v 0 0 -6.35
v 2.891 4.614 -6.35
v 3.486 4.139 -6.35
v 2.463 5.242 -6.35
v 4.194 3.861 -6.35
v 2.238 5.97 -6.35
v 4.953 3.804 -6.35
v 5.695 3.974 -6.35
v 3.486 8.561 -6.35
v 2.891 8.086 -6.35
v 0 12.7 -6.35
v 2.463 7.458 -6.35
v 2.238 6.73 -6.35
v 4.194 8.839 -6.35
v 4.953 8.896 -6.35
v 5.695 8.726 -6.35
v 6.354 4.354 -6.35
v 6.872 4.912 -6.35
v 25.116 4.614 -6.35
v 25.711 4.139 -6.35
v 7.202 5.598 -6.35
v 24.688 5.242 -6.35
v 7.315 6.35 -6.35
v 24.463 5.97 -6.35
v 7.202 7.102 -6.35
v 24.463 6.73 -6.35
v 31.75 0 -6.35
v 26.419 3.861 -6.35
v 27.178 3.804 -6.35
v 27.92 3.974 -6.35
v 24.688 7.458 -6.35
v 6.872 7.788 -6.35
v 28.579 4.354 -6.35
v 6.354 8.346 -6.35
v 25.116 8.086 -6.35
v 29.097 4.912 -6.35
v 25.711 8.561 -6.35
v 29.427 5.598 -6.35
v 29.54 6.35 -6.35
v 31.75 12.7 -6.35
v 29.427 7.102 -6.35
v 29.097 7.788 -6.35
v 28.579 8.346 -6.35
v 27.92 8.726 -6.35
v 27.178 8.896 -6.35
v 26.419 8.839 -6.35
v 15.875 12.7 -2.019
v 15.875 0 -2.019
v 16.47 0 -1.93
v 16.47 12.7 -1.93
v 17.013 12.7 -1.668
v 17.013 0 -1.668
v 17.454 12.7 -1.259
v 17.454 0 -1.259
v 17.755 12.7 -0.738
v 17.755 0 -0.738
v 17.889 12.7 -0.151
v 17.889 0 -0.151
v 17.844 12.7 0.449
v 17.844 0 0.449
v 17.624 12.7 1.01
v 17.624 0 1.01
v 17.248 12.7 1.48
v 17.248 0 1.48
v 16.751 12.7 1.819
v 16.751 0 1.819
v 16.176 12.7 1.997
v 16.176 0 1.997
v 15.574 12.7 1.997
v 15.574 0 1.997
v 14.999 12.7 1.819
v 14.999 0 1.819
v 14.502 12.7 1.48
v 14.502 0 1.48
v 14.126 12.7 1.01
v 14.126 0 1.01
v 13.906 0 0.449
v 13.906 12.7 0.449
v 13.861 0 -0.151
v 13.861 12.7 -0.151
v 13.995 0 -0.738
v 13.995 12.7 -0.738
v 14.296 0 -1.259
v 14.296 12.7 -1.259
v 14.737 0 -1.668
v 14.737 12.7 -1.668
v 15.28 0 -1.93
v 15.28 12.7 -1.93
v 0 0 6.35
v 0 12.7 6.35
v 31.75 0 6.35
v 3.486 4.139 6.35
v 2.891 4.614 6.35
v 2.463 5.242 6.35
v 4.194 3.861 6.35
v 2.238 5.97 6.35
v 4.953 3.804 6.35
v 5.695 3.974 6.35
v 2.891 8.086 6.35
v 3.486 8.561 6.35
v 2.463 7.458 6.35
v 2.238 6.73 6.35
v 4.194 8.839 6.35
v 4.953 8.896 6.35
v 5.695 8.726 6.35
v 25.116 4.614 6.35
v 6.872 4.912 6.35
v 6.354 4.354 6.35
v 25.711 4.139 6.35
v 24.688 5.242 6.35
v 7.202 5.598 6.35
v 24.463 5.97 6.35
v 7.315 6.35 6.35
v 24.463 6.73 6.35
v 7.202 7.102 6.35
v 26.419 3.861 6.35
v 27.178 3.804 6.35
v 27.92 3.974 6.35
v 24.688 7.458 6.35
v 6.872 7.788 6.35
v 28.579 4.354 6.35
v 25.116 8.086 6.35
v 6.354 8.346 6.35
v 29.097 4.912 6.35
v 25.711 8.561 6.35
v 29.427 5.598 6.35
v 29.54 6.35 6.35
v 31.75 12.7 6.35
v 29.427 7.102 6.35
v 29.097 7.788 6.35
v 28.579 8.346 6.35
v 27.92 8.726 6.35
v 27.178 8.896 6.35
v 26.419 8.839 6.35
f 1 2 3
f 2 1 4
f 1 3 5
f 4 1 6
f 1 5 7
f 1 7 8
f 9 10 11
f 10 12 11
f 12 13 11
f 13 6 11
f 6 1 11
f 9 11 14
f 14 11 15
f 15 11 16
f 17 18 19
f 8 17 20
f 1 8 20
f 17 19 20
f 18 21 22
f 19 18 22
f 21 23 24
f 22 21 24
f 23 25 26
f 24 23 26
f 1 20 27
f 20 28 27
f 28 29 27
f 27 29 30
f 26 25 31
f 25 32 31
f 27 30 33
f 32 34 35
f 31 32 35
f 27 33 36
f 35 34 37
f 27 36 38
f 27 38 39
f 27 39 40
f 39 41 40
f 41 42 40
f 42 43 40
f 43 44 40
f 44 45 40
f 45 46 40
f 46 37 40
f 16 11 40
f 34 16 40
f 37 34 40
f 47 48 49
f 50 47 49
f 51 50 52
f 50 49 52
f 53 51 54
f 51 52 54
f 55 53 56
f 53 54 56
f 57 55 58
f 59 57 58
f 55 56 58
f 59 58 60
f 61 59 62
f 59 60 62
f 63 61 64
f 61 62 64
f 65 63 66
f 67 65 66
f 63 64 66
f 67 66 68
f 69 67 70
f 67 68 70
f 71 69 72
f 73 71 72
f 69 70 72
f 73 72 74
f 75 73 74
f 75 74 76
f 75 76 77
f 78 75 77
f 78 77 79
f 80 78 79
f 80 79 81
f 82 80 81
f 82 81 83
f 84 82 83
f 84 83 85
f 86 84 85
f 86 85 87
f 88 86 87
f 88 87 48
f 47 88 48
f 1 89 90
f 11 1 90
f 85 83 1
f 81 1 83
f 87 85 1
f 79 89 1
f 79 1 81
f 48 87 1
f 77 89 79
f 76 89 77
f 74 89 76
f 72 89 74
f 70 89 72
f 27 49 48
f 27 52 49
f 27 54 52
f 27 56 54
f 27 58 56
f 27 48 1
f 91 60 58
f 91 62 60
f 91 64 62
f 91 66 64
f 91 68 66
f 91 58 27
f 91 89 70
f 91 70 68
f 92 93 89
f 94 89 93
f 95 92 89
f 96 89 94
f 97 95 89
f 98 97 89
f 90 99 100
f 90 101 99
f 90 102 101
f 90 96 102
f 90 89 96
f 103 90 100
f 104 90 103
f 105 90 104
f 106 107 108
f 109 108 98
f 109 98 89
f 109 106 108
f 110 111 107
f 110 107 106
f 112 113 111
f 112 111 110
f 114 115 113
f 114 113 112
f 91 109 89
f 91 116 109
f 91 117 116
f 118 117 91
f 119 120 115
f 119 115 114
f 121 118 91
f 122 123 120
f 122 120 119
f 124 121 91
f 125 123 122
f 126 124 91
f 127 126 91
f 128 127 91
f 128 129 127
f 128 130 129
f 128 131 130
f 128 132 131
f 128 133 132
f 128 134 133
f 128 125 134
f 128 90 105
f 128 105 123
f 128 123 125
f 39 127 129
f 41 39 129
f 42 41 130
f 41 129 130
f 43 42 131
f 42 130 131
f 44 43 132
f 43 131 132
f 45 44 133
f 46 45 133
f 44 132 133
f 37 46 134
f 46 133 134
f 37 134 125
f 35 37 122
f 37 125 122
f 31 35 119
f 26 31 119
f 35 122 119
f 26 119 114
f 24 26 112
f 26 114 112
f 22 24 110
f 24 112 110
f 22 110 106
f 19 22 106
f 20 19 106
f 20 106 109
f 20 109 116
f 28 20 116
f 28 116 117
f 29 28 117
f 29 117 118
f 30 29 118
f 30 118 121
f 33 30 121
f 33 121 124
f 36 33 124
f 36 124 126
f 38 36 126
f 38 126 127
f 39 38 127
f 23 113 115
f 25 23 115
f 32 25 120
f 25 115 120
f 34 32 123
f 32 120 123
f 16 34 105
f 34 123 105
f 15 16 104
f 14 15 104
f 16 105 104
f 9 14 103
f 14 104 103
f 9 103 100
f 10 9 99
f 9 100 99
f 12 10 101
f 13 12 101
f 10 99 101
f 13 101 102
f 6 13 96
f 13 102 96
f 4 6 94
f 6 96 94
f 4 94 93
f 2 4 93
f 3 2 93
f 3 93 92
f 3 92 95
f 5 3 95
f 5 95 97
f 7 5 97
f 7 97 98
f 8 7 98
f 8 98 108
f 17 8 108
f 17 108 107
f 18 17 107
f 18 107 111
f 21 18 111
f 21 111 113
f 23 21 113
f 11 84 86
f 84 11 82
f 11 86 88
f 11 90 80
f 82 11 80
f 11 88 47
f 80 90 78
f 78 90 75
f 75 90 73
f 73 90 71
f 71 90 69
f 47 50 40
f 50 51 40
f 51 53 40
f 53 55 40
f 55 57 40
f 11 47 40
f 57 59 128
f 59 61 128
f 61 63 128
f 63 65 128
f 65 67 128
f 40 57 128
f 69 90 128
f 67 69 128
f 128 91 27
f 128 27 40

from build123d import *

# Parameters (mm, degrees)
SKETCH1_W              = 31.75
SKETCH1_H              = 12.7
BOSS_EXTRUDE1_DEPTH    = 6.35
SKETCH2_R              = 2.5527
CUT_EXTRUDE1_DEPTH     = 37.477972806
F_10_32_TAPPED_HOLE1_D = 4.0386


with BuildPart() as part:
    # Sketch1 → Boss-Extrude1 (new, symmetric)
    with BuildSketch(Plane.XY):
        with Locations((15.875, 6.35)):
            Rectangle(SKETCH1_W, SKETCH1_H)
    extrude(amount=BOSS_EXTRUDE1_DEPTH, both=True)

    # Sketch2 → Cut-Extrude1 (cut, through all)
    with BuildSketch(Plane.XY.offset(6.35)):
        with Locations((4.7625, 6.35)):
            Circle(SKETCH2_R)
        with Locations((26.9875, 6.35)):
            Circle(SKETCH2_R)
    extrude(amount=-CUT_EXTRUDE1_DEPTH, mode=Mode.SUBTRACT)

    # #10-32 Tapped Hole1 (through all)
    with Locations(Plane(origin=(15.875, 12.7, 0), x_dir=(0, 0, 1), z_dir=(0, 1, 0))):
        with Locations((0, 0)):
            Hole(F_10_32_TAPPED_HOLE1_D / 2)


solid = part.part
